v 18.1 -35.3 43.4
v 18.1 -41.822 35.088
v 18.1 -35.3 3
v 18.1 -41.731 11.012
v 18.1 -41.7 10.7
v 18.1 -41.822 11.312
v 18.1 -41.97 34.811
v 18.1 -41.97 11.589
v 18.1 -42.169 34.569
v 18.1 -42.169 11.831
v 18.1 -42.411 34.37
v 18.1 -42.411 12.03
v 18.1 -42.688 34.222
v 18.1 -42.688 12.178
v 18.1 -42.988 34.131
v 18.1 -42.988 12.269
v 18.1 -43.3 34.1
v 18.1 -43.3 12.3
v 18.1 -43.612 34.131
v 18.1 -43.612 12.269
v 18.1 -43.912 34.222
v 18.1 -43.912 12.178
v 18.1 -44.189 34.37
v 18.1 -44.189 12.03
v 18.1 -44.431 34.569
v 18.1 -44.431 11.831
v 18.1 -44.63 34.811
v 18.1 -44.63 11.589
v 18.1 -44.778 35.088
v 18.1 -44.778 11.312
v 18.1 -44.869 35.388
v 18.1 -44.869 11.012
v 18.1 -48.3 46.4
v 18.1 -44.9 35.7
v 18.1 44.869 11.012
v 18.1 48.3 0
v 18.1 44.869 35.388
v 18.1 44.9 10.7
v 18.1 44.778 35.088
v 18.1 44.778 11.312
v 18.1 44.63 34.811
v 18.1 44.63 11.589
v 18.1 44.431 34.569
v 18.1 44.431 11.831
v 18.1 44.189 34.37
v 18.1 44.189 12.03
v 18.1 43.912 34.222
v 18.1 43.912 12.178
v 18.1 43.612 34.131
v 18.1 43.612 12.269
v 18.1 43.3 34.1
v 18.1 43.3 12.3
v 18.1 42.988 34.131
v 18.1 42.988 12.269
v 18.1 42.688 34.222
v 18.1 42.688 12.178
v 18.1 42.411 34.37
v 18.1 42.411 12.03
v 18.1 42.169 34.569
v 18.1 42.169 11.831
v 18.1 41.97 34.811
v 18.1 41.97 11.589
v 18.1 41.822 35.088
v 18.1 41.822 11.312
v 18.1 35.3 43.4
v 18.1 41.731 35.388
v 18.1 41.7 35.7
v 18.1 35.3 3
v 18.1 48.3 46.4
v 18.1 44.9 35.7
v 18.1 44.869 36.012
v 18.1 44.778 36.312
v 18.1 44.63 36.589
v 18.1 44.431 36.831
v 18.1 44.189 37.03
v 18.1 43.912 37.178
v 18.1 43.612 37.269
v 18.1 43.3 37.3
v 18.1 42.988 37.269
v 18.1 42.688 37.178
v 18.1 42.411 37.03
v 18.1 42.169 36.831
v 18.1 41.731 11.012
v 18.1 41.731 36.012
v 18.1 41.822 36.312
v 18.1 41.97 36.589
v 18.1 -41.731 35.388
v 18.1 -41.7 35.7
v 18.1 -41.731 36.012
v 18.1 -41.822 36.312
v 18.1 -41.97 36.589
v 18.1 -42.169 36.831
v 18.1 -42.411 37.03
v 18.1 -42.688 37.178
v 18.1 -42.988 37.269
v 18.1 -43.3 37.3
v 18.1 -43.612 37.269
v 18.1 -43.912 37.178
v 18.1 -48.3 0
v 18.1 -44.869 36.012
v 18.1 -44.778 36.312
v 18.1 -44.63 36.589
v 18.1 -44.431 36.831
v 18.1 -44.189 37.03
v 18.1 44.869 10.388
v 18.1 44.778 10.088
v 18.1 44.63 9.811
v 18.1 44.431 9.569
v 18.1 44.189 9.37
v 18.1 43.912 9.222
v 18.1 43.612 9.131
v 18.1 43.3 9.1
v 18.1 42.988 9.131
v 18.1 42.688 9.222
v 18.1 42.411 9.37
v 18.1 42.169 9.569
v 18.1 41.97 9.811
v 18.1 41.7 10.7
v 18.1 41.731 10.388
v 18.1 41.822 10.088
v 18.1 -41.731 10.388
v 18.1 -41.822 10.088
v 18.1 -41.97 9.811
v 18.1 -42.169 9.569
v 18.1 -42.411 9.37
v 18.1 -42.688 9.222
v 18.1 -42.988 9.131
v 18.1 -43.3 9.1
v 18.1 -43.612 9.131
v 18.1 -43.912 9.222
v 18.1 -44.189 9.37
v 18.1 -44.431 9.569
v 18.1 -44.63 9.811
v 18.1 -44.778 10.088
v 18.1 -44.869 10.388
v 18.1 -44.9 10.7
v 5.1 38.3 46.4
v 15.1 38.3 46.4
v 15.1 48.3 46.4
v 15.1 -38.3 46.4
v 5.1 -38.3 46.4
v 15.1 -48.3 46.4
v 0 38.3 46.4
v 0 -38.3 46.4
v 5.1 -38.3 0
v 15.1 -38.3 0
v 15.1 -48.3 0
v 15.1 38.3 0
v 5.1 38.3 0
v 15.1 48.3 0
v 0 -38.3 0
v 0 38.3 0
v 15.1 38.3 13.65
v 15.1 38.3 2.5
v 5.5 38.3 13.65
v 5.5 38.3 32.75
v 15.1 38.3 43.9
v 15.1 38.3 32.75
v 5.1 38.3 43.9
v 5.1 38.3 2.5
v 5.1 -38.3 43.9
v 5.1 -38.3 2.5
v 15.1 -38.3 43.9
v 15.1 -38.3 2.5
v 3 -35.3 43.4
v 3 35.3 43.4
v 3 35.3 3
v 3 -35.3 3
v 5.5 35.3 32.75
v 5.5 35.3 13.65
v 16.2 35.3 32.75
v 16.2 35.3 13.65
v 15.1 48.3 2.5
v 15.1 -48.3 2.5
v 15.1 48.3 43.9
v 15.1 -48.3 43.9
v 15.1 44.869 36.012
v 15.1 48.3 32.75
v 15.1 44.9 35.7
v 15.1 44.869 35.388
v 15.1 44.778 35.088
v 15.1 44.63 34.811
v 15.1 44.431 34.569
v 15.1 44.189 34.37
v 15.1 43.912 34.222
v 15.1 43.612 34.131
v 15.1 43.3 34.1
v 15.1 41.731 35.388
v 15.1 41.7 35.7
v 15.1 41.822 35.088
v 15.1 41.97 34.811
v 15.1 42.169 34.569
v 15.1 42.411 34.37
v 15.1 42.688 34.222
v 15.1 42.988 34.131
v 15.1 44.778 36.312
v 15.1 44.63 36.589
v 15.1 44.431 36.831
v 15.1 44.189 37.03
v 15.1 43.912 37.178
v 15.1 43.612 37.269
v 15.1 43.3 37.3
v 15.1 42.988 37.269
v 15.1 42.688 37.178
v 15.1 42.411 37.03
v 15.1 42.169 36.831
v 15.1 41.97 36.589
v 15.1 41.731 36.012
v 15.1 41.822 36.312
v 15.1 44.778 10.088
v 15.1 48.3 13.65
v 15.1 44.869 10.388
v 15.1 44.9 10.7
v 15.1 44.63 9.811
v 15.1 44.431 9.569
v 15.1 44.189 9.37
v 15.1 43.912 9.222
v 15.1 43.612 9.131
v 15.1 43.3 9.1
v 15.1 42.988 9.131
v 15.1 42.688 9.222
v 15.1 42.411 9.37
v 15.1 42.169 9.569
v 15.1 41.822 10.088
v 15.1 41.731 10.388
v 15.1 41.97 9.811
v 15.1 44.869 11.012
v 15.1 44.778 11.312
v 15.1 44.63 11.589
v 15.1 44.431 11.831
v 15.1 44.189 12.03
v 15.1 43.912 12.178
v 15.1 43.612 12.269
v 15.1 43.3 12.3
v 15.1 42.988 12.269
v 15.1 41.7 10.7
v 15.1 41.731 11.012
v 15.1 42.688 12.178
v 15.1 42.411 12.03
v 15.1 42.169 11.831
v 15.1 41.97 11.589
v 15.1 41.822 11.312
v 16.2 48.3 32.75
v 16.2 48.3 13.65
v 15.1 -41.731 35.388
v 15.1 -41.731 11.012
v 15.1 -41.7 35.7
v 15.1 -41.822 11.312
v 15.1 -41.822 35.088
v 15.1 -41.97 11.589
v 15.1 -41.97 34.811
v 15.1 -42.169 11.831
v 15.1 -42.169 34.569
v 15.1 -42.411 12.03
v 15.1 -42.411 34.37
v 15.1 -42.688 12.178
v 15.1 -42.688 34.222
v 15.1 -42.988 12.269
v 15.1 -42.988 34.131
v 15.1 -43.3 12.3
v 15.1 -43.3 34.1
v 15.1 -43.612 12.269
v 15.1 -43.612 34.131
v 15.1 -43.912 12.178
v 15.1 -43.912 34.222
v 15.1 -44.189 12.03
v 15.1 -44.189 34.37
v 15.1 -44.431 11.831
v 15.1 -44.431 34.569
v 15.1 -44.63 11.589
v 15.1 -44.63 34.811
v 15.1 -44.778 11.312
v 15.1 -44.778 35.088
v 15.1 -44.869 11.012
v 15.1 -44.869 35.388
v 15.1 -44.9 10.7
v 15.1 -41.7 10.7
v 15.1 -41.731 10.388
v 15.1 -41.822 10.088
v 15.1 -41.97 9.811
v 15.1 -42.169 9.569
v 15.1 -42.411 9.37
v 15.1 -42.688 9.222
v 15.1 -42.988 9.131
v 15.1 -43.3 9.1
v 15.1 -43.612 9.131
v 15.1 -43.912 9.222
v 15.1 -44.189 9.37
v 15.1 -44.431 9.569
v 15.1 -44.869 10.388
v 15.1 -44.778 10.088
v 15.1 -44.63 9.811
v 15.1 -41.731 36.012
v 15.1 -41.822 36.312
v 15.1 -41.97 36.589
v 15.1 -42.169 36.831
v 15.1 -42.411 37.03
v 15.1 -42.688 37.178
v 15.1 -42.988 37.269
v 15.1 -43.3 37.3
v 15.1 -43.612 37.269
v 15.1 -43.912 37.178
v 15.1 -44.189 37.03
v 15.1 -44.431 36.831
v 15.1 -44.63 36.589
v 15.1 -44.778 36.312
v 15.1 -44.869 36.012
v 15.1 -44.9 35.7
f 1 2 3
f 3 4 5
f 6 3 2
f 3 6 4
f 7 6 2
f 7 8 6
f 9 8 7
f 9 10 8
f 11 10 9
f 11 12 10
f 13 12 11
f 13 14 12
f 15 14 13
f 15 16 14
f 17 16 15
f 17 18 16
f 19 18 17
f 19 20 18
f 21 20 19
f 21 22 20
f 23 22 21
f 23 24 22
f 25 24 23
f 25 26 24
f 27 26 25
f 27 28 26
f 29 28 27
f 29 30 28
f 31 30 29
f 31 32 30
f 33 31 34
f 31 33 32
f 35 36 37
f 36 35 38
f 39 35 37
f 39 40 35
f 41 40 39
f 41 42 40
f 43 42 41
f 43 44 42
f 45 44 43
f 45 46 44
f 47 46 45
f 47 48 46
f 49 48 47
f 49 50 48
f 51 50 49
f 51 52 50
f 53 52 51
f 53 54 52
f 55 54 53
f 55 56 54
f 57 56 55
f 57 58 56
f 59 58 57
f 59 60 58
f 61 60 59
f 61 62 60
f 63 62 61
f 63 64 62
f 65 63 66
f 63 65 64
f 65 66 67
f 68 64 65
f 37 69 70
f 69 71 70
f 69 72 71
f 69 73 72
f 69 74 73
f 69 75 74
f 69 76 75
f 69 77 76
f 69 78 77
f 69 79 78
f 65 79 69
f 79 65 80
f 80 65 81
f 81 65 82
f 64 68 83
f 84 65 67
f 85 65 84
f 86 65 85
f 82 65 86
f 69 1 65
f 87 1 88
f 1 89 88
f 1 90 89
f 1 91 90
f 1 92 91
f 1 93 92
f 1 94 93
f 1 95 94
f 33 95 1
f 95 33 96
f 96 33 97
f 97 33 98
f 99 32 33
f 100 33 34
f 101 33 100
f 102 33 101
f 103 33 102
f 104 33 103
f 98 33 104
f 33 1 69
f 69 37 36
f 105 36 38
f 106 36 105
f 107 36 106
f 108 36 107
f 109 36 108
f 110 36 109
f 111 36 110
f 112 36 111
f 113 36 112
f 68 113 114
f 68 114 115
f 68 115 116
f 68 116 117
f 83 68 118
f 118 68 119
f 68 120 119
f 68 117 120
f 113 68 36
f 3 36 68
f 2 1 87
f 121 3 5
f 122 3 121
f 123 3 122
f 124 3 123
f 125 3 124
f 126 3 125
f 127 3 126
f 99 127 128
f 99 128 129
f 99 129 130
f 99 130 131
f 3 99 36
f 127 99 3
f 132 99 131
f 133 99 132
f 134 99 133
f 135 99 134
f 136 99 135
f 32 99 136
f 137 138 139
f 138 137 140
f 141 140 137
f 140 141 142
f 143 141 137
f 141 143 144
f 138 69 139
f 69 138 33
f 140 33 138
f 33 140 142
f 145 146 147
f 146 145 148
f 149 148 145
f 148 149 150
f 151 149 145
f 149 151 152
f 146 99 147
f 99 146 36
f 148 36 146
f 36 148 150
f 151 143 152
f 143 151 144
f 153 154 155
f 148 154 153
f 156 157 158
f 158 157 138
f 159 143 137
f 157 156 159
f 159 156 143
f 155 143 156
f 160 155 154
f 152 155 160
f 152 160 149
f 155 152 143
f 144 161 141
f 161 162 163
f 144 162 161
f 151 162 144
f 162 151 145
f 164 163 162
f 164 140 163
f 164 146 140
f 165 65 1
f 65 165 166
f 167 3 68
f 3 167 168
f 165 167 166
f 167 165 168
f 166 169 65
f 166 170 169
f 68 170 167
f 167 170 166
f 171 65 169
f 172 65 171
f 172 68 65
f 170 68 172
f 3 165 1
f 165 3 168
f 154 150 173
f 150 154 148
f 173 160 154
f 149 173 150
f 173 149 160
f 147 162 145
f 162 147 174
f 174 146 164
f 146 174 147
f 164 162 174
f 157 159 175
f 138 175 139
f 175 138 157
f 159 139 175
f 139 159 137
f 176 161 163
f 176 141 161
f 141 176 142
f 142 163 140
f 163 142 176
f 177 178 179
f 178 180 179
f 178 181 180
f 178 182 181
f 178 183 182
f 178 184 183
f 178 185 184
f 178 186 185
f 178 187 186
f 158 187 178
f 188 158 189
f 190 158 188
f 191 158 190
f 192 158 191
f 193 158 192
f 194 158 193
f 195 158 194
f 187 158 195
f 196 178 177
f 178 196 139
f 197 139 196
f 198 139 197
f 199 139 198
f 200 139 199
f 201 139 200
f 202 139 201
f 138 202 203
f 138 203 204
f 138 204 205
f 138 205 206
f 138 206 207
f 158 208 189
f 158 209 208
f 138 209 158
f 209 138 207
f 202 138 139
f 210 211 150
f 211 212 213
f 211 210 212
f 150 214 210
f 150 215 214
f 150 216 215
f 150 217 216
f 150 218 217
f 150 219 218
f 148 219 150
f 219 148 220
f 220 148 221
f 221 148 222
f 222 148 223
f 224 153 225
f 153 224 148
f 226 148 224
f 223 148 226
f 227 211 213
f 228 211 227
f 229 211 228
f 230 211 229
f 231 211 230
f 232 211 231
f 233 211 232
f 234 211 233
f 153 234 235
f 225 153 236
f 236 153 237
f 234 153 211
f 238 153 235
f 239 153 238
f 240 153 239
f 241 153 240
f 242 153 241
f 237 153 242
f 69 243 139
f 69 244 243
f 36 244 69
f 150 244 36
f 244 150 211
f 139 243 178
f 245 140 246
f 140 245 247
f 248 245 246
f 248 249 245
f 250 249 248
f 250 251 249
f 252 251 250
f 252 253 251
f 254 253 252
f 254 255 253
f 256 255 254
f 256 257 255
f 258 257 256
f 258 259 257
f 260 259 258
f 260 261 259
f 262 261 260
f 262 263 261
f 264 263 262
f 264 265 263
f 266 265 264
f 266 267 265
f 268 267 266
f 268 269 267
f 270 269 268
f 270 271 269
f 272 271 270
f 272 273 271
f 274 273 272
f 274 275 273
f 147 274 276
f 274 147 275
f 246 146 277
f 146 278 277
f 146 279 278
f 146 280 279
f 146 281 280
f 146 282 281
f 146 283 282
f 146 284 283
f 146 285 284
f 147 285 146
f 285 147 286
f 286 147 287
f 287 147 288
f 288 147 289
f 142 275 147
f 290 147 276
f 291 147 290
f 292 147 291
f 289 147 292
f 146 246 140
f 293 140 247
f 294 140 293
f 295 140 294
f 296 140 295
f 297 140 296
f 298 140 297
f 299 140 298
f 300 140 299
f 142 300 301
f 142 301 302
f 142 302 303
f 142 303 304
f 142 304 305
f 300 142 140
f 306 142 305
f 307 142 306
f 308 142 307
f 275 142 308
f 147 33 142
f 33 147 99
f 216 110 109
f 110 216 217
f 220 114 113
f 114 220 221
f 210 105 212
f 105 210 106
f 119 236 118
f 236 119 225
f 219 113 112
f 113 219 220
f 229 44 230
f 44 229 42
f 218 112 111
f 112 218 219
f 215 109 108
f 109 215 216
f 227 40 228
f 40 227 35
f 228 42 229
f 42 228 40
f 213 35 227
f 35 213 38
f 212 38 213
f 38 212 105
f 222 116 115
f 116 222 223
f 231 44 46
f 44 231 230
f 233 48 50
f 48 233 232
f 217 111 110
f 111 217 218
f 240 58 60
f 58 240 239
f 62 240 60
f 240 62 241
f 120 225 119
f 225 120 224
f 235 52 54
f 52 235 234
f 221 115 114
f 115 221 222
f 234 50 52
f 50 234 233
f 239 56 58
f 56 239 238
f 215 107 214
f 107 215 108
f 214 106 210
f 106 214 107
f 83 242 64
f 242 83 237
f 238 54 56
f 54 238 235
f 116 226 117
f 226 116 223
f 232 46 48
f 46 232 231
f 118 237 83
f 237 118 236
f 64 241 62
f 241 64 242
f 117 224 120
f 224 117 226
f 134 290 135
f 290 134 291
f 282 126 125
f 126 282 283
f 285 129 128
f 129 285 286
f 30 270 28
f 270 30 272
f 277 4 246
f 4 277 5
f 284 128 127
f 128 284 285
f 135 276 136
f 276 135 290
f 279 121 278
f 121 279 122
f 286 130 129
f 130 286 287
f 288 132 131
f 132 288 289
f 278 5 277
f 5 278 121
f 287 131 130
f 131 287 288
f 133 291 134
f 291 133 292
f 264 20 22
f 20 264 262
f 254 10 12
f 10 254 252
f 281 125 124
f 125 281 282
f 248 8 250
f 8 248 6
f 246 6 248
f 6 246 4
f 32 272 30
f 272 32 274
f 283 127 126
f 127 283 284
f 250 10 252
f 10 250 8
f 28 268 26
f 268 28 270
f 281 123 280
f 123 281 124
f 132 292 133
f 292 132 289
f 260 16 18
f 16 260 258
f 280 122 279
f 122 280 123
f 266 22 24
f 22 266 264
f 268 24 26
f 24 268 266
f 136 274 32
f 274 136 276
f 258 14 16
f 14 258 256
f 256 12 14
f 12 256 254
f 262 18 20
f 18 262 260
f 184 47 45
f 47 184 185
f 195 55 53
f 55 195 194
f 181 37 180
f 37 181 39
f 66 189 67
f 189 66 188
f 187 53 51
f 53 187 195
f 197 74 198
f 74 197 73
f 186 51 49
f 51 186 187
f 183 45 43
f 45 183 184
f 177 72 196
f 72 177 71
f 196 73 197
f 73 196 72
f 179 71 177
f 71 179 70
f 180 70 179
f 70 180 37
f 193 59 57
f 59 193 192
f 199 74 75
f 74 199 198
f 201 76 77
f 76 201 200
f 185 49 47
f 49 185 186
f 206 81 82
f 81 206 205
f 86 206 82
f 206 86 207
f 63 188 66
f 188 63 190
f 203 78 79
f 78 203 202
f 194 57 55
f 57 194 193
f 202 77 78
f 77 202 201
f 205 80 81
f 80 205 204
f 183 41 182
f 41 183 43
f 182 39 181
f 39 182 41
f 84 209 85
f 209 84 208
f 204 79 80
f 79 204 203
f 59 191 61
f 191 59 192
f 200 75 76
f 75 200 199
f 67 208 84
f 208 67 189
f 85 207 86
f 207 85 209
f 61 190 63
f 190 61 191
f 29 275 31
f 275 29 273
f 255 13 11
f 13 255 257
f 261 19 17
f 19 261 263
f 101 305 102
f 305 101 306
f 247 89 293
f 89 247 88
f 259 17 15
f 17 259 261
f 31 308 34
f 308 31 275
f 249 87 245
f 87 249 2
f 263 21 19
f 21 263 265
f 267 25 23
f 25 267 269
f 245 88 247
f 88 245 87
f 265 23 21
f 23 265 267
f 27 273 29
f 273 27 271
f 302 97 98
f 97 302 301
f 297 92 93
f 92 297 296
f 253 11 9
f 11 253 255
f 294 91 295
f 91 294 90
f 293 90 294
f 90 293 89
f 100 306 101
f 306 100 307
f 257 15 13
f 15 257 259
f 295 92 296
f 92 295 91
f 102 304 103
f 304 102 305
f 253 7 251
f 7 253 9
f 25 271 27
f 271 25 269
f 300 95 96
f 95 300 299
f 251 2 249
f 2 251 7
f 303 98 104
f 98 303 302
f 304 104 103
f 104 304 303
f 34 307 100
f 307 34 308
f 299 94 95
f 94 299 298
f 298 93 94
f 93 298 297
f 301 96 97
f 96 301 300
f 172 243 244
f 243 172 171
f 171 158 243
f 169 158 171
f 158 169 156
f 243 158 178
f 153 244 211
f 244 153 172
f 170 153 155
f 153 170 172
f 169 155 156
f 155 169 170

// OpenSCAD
// wifi_shell — 新 WiFi 壳子 v1 (与 build_shell.py 同参, 2026-07-22 几何)。
// 侧开口五面盒: 内腔 15.1×70.6×40.4, 壁 3, 开口面 = +X 侧 70.6×40.4 (无壁)。
// 零件系: X0 = 封闭壁外面, 开口在 X=18.1; Z0 = 外底面; Y 对称。
// 安装 = 倒扣 (开口/双端沿朝下贴盘), 罩住放平模块 40×70×14.5; 打印同姿态零支撑。
// ±Y 端沿 (X15.1..18.1 与开口面共面) 外伸 10, 各 2×Φ3.2 + 2 三角筋 2.5 厚 45°。
// +Y 端壁出口窗 10.7×19.1 对准放平母头 (轴线离开口面 7.25), 切穿 +Y 沿板。
// 装配位: 盒 footprint 中线 XC=43 + 沿长边平移 −15, 随 135° 组转 (assembly_v2/v2_1)。

cav = [15.1, 70.6, 40.4];  wall = 3;
ix0 = wall;  ix1 = wall + cav[0];            // 内腔 X 3..18.1 (开口 = X18.1)
iy  = cav[1]/2;  iz0 = wall;  iz1 = wall + cav[2];
ox1 = ix1;  oy = iy + wall;  oz1 = iz1 + wall;   // 外廓 18.1 × ±38.3 × 46.4
win_w = 10.7;  win_h = 19.1;                 // 出口窗 (母头壳 10.3×18.7 +0.4)
win_xc = ox1 - 14.5/2;                       // 10.85 = 放平模块口轴线
win_zc = (iz0 + iz1)/2;                      // 23.2 = 腔 Z 中线
flg_l = 10;  flg_t = 3;  flg_x0 = ox1 - flg_t;   // 沿: X 15.1..18.1, 外伸 10
flg_y1 = oy + flg_l;                         // 48.3
m3 = 3.2;  hole_yc = oy + 5;                 // 孔距壁 5
hole_zs = [(oz1)/2 - 12.5, (oz1)/2 + 12.5];  // 10.7 / 35.7 (宽向 c-c 25 对称)
gus_t = 2.5;  gus_arm = 10;                  // 三角筋 45°, X 5.1..15.1
gus_zs = [0, oz1 - gus_t];                   // 贴沿的两条宽向端边

module bbox(x0,x1,y0,y1,z0,z1){ translate([x0,y0,z0]) cube([x1-x0,y1-y0,z1-z0]); }
module gusset(y_wall, y_out, z0){            // X-Y 面直角三角, 沿 Z 挤 gus_t
  translate([0,0,z0]) linear_extrude(gus_t)
    polygon(y_out > y_wall ? [[flg_x0,y_wall],[flg_x0,y_out],[flg_x0-gus_arm,y_wall]]
                           : [[flg_x0-gus_arm,y_wall],[flg_x0,y_out],[flg_x0,y_wall]]);
}

difference(){
  union(){
    difference(){
      bbox(0,ox1,-oy,oy,0,oz1);                       // 外块
      bbox(ix0,ix1+1,-iy,iy,iz0,iz1);                 // 内腔 (开口朝 +X)
    }
    bbox(flg_x0,ox1,oy,flg_y1,0,oz1);                 // +Y 沿
    bbox(flg_x0,ox1,-flg_y1,-oy,0,oz1);               // -Y 沿
    for(z0=gus_zs){ gusset(oy,flg_y1,z0); gusset(-oy,-flg_y1,z0); }   // 筋 ×4
  }
  // 出口窗 (穿 +Y 端壁 + 切穿 +Y 沿板 —— 必须在沿之后挖)
  bbox(win_xc-win_w/2,win_xc+win_w/2,iy-1,flg_y1+1,win_zc-win_h/2,win_zc+win_h/2);
  for(zc=hole_zs) for(yc=[hole_yc,-hole_yc])          // 4×Φ3.2 (孔轴沿 X)
    translate([flg_x0-1,yc,zc]) rotate([0,90,0]) cylinder(h=flg_t+2, d=m3, $fn=32);
}
